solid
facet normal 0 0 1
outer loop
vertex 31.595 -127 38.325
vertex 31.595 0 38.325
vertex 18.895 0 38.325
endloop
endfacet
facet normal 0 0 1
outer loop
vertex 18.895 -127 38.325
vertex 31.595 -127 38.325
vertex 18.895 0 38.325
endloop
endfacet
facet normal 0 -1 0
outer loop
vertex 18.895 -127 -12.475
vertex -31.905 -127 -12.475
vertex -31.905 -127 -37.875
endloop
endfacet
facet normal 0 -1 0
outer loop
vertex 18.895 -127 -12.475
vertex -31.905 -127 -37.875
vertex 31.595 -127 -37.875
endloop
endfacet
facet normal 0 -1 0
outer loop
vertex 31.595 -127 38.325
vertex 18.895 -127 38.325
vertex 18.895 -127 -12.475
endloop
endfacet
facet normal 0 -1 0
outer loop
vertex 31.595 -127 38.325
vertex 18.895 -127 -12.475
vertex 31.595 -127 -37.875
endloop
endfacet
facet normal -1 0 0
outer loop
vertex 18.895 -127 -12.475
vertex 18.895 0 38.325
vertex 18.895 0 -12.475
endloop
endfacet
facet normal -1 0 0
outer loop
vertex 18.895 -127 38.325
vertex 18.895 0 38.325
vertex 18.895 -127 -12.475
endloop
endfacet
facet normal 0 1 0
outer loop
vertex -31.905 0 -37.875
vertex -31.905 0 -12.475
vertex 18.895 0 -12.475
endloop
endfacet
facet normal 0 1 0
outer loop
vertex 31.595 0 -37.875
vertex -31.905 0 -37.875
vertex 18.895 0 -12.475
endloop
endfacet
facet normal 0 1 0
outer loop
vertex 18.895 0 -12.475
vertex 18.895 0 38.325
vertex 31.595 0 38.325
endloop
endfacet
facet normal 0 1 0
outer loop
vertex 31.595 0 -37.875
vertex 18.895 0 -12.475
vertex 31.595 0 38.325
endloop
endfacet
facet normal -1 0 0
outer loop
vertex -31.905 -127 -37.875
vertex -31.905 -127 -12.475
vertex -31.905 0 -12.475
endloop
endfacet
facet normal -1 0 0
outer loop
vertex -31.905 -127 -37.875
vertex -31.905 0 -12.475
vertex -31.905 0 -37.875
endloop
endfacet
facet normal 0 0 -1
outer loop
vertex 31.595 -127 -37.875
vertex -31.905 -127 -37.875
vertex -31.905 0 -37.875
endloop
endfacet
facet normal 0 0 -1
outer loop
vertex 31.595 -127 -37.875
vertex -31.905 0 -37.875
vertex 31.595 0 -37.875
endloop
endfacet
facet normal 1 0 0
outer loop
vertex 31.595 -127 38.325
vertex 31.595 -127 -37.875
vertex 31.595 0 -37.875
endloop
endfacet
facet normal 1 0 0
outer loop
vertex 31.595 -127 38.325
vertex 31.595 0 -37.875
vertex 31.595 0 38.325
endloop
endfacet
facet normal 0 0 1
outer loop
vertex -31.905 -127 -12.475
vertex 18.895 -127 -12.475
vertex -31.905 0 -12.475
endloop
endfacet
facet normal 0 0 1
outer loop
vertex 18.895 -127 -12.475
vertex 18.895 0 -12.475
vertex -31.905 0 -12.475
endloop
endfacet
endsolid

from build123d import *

# Parameters (mm, degrees)
F1_DEPTH = 25.4
F2_DEPTH = 101.6
F3_W     = 127
F3_H     = 50.8
F5_DEPTH = 25.4


with BuildPart() as f1:
    # F0 (on Front) → F1 (new body)
    with BuildSketch(Plane.XZ):
        Polygon((-6.504758, -12.474676), (-31.904758, -12.474676), (-31.904758, -37.874676), (31.595242, -37.874676), (31.595242, 38.325324), (-6.504758, 38.325324), align=None)
    extrude(amount=F1_DEPTH)

    # F1_face (on face) → F2 (join)
    with BuildSketch(Plane(origin=(6.772515, -25.4, -4.392858), x_dir=(1, 0, 0), z_dir=(0, -1, 0))):
        Polygon((-13.277273, 42.718182), (-13.277273, -8.081818), (-38.677273, -8.081818), (-38.677273, -33.481818), (24.822727, -33.481818), (24.822727, 42.718182), align=None)
    extrude(amount=F2_DEPTH)

    # F3 (on face) → F5 (cut)
    with BuildSketch(Plane(origin=(-6.504758, 0, 0), x_dir=(0, -1, 0), z_dir=(-1, 0, 0))):
        with Locations((63.5, 12.925324)):
            Rectangle(F3_W, F3_H)
    extrude(amount=-F5_DEPTH, mode=Mode.SUBTRACT)


solid = f1.part
